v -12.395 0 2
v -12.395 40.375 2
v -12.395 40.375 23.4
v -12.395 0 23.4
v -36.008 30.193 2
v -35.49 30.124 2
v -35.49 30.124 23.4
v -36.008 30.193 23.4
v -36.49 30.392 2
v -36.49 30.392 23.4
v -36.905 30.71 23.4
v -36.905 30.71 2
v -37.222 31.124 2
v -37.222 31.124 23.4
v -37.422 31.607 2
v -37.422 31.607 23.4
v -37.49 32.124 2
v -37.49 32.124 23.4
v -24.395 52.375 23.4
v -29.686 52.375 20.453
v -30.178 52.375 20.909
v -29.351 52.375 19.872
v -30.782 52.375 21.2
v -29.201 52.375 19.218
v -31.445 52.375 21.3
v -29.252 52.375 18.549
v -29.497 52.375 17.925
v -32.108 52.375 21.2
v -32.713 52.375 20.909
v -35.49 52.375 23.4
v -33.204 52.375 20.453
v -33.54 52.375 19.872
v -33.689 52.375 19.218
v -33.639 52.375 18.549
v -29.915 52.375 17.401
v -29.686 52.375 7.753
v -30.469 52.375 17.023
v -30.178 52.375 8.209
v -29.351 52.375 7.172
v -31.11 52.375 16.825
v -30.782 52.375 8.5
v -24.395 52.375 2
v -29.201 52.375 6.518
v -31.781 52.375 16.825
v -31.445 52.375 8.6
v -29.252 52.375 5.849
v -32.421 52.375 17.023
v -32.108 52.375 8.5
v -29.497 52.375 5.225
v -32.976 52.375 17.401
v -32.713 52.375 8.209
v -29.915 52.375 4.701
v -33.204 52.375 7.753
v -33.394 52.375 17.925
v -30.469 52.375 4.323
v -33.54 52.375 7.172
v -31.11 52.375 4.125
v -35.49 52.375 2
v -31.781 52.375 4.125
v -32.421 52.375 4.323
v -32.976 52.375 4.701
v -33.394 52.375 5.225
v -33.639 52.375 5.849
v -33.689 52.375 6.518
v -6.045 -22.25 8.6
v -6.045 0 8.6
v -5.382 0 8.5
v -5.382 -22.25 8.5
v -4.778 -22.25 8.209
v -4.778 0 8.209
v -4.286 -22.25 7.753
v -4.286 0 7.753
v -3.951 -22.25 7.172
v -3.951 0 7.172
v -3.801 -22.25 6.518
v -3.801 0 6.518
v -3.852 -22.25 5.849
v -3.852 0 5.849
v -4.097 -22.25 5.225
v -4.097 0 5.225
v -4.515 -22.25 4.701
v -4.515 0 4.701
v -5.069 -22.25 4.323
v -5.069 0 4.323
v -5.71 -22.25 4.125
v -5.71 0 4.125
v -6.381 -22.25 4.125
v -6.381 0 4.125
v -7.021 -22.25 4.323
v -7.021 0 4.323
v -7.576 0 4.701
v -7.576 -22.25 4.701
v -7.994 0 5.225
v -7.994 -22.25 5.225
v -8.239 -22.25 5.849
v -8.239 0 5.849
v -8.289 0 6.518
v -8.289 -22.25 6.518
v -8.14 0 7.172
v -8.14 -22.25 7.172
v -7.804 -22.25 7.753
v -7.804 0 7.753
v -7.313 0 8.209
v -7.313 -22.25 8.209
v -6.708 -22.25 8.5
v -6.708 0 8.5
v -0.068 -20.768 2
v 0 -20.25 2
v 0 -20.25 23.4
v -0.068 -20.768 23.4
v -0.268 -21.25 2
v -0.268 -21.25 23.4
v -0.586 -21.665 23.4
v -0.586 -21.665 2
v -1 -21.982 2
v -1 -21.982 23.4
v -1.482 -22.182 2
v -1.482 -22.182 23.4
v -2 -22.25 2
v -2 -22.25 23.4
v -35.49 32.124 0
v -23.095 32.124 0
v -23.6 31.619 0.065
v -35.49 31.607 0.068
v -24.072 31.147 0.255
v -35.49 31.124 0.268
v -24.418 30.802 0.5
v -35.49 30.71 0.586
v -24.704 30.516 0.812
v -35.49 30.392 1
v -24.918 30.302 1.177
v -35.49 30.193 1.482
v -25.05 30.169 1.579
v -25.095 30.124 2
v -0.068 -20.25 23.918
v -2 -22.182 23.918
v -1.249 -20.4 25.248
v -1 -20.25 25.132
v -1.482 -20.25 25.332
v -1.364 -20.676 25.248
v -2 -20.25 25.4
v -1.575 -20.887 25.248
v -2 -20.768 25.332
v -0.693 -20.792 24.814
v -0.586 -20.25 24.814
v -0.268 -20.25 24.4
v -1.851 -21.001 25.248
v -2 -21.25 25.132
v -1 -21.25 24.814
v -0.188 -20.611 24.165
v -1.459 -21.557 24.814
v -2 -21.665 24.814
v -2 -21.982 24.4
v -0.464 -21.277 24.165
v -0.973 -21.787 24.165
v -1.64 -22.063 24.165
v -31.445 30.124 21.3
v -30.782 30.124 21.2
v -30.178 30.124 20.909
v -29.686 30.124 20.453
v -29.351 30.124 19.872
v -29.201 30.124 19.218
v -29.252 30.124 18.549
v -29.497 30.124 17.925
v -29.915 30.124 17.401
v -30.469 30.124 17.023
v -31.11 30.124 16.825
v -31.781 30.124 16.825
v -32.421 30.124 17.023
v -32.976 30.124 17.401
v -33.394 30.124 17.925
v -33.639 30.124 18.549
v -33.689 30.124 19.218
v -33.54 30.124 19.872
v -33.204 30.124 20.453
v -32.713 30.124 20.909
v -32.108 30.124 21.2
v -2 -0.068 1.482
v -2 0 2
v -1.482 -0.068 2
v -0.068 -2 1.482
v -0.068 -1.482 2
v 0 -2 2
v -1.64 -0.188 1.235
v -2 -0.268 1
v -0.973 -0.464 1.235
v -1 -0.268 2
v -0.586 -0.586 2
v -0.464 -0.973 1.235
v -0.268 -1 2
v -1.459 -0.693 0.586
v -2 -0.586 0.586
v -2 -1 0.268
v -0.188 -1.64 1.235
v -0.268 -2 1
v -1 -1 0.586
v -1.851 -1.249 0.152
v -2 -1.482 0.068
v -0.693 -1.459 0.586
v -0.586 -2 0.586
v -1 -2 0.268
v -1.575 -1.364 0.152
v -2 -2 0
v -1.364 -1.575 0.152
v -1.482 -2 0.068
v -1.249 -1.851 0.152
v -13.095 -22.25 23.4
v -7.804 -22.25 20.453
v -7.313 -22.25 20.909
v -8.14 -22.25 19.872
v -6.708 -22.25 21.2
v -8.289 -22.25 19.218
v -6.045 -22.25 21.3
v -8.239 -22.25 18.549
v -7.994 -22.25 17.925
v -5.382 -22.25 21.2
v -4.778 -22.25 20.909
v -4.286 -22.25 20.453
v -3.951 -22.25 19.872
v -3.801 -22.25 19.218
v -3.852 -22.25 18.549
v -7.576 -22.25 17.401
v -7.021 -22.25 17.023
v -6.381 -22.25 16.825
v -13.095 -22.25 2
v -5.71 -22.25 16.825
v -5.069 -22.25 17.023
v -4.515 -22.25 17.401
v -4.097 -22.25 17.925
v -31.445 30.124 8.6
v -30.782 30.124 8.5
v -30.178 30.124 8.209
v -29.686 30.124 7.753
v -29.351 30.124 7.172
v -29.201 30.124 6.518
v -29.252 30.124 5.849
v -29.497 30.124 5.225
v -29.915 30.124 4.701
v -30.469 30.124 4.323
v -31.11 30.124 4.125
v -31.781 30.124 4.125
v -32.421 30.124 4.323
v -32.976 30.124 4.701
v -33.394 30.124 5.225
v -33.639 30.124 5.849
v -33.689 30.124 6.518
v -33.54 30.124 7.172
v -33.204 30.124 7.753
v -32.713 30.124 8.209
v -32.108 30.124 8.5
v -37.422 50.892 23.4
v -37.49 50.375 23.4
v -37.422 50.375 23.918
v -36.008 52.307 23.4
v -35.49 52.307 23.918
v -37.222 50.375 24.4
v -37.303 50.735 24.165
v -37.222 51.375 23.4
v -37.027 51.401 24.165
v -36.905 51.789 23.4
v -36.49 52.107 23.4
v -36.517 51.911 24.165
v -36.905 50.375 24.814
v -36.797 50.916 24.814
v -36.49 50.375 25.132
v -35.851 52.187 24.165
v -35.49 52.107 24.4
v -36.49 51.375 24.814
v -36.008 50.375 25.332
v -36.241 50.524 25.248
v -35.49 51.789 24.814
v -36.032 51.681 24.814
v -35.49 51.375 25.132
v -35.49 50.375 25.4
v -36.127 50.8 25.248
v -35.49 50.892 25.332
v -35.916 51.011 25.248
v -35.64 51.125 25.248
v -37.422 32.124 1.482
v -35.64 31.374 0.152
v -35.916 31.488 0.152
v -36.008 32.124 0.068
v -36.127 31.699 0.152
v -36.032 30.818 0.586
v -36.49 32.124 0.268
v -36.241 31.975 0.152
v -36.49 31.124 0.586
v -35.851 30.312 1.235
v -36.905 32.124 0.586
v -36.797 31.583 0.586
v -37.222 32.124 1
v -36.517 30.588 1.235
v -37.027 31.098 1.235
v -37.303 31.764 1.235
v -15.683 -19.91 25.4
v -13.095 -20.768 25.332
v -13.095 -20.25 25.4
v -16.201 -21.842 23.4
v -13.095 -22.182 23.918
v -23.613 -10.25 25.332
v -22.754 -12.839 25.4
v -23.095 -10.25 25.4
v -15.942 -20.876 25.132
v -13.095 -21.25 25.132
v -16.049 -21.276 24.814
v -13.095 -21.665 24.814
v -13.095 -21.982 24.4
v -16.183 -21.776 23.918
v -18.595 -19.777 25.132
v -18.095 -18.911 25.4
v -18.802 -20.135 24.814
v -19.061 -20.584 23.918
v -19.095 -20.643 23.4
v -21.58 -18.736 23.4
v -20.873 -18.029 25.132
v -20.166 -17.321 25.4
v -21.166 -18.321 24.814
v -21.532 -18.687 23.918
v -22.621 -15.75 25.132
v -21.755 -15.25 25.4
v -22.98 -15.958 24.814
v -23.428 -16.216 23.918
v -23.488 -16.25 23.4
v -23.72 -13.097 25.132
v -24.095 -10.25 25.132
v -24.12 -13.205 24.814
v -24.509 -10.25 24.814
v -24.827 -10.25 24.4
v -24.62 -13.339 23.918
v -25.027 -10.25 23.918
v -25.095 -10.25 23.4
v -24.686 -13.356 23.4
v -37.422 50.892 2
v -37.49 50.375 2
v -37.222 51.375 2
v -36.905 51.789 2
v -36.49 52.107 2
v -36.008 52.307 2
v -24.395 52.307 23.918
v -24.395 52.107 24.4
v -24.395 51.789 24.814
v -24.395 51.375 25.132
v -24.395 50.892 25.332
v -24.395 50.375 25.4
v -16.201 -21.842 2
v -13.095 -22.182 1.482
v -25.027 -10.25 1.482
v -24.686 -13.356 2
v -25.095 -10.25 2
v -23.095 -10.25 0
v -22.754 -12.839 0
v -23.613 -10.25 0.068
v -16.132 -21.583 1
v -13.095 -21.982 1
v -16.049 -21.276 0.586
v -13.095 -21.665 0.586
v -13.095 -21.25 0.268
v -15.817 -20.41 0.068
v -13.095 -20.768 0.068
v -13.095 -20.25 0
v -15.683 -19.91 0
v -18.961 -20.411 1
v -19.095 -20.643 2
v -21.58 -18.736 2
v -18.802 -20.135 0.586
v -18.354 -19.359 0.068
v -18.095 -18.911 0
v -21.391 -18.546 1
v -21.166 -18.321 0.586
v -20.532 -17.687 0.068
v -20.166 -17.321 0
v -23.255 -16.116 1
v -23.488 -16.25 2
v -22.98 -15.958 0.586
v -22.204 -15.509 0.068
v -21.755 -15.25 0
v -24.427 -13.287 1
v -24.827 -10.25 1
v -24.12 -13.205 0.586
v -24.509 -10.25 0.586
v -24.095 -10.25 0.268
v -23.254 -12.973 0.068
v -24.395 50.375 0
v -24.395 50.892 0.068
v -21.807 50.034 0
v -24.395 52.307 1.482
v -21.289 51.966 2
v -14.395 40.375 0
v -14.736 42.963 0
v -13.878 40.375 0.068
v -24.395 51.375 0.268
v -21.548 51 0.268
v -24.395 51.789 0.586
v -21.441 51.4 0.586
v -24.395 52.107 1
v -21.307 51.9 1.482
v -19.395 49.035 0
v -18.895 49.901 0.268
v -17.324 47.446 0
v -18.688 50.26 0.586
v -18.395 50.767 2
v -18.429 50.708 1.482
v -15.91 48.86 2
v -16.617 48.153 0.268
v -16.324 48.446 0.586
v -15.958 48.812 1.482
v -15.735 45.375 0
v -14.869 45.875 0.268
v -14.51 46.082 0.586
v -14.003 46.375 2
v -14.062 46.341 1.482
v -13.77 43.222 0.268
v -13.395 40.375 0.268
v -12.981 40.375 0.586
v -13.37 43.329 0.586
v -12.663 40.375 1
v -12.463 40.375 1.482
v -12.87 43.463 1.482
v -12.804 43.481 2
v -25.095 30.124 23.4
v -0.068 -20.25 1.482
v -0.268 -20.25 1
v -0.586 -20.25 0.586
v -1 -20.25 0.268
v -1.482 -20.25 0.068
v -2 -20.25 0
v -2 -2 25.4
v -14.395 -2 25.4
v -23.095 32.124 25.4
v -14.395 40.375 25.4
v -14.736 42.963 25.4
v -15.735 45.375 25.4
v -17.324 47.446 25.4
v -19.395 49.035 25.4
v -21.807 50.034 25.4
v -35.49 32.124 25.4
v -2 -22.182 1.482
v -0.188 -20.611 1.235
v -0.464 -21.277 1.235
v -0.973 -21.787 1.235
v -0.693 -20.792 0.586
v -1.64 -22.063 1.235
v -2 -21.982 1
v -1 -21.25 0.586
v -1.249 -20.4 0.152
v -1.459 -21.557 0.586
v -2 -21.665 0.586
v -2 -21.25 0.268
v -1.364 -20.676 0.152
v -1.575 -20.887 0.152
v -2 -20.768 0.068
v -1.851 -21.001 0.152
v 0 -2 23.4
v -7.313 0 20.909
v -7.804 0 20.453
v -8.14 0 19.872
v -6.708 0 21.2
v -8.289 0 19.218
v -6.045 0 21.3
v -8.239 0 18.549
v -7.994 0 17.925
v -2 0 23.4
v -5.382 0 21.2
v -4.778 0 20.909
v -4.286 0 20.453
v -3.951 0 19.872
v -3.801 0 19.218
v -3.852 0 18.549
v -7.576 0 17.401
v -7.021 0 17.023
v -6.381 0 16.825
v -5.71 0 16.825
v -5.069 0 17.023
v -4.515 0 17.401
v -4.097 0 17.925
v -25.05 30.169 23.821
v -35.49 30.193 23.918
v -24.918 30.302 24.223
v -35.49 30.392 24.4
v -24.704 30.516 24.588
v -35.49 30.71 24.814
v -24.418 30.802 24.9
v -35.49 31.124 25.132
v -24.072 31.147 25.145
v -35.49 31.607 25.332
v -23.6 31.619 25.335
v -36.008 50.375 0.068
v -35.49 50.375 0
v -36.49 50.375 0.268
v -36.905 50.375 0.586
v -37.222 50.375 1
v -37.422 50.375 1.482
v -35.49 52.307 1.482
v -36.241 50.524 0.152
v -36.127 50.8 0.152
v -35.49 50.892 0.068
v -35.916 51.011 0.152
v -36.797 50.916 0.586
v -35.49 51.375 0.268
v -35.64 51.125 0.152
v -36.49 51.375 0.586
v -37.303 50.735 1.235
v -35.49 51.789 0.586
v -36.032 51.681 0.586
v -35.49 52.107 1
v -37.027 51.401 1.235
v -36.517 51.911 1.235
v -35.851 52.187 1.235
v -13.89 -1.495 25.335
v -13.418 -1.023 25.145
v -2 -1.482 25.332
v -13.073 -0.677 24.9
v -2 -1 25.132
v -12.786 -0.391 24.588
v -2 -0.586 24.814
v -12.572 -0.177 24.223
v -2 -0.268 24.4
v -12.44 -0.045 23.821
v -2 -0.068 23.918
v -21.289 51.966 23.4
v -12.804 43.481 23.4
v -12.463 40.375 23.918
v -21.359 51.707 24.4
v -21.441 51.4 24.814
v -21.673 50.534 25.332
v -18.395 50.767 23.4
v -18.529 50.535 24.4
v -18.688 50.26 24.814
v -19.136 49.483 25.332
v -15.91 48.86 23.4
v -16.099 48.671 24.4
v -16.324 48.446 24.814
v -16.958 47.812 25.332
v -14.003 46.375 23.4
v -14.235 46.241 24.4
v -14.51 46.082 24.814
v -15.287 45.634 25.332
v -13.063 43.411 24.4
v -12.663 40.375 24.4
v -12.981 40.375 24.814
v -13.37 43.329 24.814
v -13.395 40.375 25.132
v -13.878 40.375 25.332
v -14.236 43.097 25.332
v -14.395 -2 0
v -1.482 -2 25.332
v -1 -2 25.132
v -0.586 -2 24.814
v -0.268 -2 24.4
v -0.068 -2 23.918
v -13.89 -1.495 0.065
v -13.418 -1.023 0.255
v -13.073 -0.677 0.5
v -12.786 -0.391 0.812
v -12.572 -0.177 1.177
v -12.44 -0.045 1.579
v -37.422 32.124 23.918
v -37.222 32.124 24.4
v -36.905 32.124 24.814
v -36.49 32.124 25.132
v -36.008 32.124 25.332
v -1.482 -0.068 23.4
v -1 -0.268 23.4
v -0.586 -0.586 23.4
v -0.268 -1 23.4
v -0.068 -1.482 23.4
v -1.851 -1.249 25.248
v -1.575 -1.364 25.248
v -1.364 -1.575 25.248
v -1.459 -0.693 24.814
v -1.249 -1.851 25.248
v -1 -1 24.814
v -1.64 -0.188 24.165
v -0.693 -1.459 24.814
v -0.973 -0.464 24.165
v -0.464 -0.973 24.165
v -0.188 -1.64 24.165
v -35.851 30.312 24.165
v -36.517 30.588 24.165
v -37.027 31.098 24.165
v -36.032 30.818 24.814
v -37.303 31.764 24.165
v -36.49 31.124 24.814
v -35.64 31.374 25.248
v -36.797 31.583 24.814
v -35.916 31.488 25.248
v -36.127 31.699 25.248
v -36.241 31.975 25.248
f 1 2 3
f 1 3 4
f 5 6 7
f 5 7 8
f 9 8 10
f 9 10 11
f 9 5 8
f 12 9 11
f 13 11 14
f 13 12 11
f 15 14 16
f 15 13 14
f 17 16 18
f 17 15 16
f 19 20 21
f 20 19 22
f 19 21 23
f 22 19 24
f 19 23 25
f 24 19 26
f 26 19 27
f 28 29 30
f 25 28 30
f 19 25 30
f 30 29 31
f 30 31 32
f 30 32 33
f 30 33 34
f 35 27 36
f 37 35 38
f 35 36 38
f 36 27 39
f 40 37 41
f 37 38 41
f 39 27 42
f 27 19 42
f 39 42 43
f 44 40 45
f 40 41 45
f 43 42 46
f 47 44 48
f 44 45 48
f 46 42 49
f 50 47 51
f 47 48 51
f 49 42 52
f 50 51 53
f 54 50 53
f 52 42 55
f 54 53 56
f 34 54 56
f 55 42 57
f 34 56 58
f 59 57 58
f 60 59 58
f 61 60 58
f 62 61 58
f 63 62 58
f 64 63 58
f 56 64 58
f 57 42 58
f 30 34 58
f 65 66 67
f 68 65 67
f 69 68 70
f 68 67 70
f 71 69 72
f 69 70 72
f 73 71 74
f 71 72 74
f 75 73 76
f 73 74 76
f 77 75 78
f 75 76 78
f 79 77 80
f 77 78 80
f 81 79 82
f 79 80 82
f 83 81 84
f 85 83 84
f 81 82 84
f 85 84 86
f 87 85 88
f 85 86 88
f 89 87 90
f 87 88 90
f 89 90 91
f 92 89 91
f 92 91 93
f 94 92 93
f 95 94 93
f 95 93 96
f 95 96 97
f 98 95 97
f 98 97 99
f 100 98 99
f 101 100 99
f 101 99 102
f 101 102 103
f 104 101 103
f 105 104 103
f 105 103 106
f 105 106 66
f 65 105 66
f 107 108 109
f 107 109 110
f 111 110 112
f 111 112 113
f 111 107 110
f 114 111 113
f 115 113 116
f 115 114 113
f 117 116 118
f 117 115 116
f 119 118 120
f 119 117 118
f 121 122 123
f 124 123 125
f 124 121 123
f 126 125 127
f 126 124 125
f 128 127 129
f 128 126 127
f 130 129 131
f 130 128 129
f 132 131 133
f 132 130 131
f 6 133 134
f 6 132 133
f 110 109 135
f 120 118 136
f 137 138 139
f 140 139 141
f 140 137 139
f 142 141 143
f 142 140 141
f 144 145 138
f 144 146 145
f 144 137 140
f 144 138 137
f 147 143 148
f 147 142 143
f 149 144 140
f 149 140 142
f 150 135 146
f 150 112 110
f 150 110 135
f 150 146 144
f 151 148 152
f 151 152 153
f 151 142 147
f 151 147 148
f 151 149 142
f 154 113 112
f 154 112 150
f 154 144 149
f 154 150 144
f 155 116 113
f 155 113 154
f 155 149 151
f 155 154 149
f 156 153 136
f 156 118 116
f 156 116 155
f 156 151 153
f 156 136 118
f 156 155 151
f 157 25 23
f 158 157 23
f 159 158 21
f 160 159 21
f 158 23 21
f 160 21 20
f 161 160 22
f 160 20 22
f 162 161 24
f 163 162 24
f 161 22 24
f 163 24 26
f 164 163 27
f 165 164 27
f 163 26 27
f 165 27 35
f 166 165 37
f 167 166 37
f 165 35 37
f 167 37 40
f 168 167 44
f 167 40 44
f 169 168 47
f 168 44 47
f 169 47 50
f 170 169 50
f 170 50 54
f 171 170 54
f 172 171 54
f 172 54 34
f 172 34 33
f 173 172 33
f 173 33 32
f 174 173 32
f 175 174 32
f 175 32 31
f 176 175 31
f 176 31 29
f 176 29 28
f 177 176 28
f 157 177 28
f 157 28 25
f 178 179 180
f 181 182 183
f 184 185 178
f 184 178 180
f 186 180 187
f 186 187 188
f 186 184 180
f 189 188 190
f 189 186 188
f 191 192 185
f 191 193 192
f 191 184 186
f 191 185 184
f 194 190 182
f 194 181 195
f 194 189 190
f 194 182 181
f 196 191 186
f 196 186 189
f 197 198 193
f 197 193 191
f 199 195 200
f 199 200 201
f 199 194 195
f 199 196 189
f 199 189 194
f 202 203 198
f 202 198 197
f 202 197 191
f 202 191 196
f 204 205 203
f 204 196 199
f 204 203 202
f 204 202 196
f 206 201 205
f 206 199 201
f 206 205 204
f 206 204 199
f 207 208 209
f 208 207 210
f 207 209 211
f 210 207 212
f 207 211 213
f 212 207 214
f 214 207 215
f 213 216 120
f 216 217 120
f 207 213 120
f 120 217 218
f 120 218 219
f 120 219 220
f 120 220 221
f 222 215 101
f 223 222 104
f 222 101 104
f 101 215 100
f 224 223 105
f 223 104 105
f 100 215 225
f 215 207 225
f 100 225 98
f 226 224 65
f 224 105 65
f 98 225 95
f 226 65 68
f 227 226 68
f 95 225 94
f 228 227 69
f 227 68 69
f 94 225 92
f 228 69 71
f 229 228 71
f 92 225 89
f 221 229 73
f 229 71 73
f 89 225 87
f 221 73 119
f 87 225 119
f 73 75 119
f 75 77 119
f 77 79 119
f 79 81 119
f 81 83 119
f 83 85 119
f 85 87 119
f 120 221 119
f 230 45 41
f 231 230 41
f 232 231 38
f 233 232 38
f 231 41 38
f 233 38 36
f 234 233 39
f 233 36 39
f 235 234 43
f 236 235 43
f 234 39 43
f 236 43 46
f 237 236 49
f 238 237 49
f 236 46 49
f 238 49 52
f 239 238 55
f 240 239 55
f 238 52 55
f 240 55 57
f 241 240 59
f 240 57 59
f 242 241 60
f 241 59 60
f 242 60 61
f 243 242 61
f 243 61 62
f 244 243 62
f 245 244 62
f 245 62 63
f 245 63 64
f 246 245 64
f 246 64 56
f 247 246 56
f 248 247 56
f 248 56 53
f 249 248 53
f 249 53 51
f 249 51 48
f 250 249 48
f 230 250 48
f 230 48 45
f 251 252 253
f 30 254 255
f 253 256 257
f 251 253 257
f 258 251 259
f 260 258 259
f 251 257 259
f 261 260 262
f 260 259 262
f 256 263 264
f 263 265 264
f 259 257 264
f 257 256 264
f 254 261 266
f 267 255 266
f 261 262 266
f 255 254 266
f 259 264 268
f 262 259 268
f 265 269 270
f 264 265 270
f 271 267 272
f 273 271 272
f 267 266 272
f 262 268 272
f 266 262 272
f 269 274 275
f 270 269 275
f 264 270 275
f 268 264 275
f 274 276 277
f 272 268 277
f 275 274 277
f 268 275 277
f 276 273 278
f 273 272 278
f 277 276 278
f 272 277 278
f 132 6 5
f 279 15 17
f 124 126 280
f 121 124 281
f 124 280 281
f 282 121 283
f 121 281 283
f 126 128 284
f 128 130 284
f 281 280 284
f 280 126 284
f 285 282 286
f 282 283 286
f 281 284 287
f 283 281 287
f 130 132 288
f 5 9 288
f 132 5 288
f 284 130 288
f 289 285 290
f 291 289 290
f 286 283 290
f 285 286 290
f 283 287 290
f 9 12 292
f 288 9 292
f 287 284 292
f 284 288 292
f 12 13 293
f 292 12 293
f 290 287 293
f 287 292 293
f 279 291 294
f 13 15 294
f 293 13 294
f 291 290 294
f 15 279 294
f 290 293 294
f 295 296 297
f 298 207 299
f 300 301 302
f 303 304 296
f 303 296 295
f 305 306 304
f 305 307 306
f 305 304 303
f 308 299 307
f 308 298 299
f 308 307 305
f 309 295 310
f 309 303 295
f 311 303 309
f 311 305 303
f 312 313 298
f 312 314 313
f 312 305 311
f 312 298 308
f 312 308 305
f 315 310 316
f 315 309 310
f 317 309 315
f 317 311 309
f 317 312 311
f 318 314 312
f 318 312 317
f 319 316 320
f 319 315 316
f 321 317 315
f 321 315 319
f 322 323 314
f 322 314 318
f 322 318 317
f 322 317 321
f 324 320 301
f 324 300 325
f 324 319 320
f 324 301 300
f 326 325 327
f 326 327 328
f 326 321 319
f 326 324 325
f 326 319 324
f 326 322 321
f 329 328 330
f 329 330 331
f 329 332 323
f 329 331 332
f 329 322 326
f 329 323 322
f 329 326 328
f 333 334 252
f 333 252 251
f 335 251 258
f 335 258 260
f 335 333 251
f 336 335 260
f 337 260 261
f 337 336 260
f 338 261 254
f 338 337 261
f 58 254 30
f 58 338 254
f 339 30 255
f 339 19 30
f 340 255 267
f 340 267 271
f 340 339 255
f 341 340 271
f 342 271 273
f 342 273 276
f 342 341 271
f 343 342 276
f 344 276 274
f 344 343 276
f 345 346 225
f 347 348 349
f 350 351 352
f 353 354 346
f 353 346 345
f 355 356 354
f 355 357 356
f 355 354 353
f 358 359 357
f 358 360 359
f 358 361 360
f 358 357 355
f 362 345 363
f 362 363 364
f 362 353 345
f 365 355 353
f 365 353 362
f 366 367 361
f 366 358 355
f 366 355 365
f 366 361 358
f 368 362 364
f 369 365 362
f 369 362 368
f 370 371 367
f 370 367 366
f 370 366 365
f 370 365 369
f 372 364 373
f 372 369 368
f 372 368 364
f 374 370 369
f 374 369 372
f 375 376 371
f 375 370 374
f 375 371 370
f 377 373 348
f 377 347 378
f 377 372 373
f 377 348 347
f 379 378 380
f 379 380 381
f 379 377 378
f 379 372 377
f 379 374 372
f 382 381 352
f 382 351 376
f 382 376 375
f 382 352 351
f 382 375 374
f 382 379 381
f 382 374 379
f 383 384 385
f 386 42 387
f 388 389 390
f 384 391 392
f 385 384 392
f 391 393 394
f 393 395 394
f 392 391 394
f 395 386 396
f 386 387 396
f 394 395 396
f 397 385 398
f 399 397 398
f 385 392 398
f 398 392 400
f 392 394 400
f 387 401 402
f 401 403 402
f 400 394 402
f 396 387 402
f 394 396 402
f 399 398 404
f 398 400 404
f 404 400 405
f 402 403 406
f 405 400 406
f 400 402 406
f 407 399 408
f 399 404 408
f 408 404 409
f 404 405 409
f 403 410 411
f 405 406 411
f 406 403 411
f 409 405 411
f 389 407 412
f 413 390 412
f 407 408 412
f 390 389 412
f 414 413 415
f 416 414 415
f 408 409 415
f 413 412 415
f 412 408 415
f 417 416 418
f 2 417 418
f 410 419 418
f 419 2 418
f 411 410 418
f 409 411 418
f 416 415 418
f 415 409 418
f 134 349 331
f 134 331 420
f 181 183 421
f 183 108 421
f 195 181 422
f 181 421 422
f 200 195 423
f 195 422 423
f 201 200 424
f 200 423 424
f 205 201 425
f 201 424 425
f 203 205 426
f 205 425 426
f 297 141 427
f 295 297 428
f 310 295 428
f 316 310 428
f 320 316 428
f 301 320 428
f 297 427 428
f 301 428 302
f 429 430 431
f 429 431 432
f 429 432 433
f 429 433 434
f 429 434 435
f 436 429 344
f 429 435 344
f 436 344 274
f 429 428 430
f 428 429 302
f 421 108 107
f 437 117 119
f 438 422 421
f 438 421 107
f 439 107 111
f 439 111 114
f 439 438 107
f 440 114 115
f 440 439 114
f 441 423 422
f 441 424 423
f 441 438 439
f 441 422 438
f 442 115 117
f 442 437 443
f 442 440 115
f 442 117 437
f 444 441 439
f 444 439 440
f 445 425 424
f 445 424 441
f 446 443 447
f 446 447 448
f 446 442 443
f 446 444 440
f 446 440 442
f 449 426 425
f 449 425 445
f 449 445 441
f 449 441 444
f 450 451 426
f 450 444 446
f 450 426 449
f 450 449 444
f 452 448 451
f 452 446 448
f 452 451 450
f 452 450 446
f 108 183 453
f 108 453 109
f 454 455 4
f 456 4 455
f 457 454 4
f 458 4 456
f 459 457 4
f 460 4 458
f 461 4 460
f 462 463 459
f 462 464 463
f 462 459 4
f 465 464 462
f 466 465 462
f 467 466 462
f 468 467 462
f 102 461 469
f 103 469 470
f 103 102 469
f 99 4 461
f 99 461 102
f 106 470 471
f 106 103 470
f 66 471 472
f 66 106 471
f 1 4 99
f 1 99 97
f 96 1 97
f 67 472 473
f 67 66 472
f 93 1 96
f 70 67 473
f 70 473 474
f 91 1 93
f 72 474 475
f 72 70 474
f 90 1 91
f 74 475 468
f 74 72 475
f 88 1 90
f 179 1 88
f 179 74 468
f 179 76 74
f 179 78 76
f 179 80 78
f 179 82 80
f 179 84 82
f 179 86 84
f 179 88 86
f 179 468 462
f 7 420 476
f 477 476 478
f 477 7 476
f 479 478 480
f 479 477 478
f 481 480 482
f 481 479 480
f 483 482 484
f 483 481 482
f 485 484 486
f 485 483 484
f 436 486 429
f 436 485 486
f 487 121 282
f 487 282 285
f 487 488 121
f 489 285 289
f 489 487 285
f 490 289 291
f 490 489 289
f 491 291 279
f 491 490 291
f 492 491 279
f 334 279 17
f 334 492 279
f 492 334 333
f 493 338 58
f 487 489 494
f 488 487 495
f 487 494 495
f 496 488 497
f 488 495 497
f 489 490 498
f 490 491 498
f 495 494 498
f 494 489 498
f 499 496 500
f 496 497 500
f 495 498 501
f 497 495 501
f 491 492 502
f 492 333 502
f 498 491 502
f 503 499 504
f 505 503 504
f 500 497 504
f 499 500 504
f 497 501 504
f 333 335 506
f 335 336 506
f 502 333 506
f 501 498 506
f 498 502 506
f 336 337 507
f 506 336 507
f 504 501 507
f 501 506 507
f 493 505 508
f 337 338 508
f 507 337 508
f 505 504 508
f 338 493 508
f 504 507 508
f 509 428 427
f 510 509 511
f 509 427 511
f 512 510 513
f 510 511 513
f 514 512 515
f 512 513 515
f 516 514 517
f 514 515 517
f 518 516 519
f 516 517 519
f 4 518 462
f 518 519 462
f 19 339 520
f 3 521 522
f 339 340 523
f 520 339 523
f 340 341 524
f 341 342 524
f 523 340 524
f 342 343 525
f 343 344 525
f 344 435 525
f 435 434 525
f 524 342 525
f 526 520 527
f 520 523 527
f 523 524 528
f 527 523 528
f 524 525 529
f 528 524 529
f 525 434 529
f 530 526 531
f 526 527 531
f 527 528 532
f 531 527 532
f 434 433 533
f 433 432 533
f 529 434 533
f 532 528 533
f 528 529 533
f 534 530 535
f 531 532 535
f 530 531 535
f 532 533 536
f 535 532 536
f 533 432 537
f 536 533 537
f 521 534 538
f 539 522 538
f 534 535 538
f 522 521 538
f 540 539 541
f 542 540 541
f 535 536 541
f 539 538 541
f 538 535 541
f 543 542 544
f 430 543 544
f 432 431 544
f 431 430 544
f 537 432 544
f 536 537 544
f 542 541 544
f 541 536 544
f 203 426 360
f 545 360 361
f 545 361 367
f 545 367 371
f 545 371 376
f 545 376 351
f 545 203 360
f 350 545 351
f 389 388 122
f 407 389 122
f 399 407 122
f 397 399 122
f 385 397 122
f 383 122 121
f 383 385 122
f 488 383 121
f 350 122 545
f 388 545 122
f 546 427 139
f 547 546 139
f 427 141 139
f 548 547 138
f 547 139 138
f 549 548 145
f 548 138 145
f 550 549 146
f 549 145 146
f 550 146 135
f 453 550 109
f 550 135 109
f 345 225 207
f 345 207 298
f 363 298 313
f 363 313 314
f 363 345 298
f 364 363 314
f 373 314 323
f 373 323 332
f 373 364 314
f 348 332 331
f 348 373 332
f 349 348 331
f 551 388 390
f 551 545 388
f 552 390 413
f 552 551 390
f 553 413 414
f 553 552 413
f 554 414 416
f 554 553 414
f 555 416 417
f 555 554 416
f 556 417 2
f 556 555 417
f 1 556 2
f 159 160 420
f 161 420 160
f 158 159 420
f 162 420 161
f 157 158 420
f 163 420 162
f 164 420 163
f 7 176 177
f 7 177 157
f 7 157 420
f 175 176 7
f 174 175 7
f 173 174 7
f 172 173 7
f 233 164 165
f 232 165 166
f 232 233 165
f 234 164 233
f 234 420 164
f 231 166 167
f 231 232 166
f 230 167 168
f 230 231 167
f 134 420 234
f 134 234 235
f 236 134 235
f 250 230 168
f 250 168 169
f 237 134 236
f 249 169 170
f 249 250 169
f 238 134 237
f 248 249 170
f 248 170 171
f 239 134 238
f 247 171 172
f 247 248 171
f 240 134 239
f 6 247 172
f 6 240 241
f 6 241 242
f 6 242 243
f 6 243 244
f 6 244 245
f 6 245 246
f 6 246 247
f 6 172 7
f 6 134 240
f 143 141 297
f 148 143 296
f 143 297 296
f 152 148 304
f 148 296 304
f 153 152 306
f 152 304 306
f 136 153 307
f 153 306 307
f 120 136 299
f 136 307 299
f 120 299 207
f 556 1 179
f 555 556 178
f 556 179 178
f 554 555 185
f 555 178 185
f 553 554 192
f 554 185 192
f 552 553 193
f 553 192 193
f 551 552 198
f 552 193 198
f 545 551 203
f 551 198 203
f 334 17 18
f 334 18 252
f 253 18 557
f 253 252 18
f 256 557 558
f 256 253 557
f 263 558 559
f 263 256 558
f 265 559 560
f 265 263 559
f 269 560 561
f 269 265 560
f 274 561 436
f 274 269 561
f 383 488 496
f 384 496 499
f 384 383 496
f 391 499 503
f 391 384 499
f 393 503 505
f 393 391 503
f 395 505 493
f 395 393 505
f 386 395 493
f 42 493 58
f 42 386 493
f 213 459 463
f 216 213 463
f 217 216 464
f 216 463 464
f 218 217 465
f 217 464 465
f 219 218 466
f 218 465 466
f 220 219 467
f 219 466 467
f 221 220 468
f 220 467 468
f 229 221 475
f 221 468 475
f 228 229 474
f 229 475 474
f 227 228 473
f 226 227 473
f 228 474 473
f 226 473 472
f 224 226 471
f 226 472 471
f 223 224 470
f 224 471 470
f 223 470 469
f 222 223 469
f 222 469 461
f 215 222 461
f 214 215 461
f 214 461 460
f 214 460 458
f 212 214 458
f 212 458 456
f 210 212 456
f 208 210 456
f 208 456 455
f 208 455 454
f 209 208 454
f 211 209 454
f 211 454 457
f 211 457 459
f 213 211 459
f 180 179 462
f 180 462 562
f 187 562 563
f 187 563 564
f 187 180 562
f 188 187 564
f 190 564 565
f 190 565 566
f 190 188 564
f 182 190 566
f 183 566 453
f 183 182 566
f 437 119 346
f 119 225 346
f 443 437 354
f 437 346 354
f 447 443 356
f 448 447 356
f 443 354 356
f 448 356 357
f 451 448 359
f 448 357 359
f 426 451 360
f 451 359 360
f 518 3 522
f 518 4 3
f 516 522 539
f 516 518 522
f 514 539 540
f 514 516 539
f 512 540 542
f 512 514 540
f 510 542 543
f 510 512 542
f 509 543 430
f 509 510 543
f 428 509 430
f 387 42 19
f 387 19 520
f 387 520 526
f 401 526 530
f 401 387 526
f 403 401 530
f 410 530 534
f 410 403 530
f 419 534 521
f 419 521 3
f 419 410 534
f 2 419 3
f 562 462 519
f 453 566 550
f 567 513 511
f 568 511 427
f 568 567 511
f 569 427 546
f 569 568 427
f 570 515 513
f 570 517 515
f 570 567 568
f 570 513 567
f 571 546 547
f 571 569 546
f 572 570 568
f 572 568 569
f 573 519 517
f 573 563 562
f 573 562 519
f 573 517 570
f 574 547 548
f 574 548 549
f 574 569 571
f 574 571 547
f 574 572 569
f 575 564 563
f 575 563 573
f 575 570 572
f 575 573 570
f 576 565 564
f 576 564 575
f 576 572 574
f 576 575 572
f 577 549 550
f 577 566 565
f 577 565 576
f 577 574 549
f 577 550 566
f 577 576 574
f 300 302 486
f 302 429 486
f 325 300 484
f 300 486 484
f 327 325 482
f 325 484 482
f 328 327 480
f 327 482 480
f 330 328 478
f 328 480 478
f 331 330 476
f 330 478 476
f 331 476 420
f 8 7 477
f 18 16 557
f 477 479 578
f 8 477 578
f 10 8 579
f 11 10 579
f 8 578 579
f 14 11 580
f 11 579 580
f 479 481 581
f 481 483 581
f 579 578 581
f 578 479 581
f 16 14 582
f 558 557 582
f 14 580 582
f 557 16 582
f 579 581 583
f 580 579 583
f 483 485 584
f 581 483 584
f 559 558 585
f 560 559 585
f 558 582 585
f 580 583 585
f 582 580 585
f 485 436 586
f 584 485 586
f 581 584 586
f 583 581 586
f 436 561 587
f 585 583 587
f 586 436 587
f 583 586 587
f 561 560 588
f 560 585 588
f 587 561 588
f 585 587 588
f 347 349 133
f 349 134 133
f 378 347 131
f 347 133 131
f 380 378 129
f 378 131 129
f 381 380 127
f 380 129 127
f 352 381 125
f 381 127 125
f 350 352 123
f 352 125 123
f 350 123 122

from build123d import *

# Parameters (mm, degrees)
BOSS_EXTRUDE1_DEPTH = 25.4
SKETCH2_R           = 2.25
CUT_EXTRUDE1_DEPTH  = 88.290380725
FILLET1_R           = 2


with BuildPart() as part:
    # Sketch1 → Boss-Extrude1 (new body)
    with BuildSketch(Plane.XY):
        with BuildLine():
            Line((-12.3952, 40.3748), (-12.3952, 0))
            Line((-12.3952, 0), (-12.3952, -22.2504))
            Line((-12.3952, -22.2504), (-13.0952, -22.2504))
            ThreePointArc((-13.0952, -22.2504), (-21.580481374, -18.735681374), (-25.0952, -10.2504))
            Line((-25.0952, -10.2504), (-25.0952, 30.1244))
            Line((-25.0952, 30.1244), (-25.0952, 52.3748))
            Line((-25.0952, 52.3748), (-24.3952, 52.3748))
            ThreePointArc((-24.3952, 52.3748), (-15.909918626, 48.860081374), (-12.3952, 40.3748))
        make_face()
        with BuildLine():
            ThreePointArc((-37.4904, 50.3748), (-36.904613562, 51.789013562), (-35.4904, 52.3748))
            Line((-35.4904, 52.3748), (-25.0952, 52.3748))
            Line((-25.0952, 52.3748), (-25.0952, 30.1244))
            Line((-25.0952, 30.1244), (-35.4904, 30.1244))
            ThreePointArc((-35.4904, 30.1244), (-36.904613562, 30.710186438), (-37.4904, 32.1244))
            Line((-37.4904, 32.1244), (-37.4904, 50.3748))
        make_face()
        with BuildLine():
            ThreePointArc((0, -20.2504), (-0.585786438, -21.664613562), (-2, -22.2504))
            Line((-2, -22.2504), (-12.3952, -22.2504))
            Line((-12.3952, -22.2504), (-12.3952, 0))
            Line((-12.3952, 0), (-2, 0))
            ThreePointArc((-2, 0), (-0.585786438, -0.585786438), (0, -2))
            Line((0, -2), (0, -20.2504))
        make_face()
    extrude(amount=BOSS_EXTRUDE1_DEPTH)

    # Sketch2 → Cut-Extrude1 (cut, through all)
    with BuildSketch(Plane(origin=(0, 52.3748, 0), x_dir=(1, 0, 0), z_dir=(0, 1, 0))):
        with Locations(Location((-31.4452, -6.35, 0), (0, 0, 270))):
            Circle(SKETCH2_R)
        with Locations(Location((-31.4452, -19.05, 0), (0, 0, 270))):
            Circle(SKETCH2_R)
        with Locations(Location((-6.0452, -6.35, 0), (0, 0, 270))):
            Circle(SKETCH2_R)
        with Locations(Location((-6.0452, -19.05, 0), (0, 0, 270))):
            Circle(SKETCH2_R)
    extrude(amount=-CUT_EXTRUDE1_DEPTH, mode=Mode.SUBTRACT)

    # Fillet1
    fillet1_edges = [part.edges().sort_by_distance(p)[0] for p in [
        (-15.909918626, 48.860081374, 25.4),
        (-29.9428, 52.3748, 25.4),
        (-7.1976, 0, 0),
        (-0.585786438, -0.585786438, 0),
        (0, -11.1252, 0),
        (-0.585786438, -21.664613562, 0),
        (-7.5476, -22.2504, 0),
        (-21.580481374, -18.735681374, 0),
        (-25.0952, 9.937, 0),
        (-30.2928, 30.1244, 0),
        (-36.904613562, 30.710186438, 0),
        (-37.4904, 41.2496, 0),
        (-36.904613562, 51.789013562, 0),
        (-29.9428, 52.3748, 0),
        (-15.909918626, 48.860081374, 0),
        (-36.904613562, 51.789013562, 25.4),
        (-12.3952, 20.1874, 0),
        (-37.4904, 41.2496, 25.4),
        (-36.904613562, 30.710186438, 25.4),
        (-30.2928, 30.1244, 25.4),
        (-25.0952, 9.937, 25.4),
        (-21.580481374, -18.735681374, 25.4),
        (-12.3952, 20.1874, 25.4),
        (-7.5476, -22.2504, 25.4),
        (-0.585786438, -21.664613562, 25.4),
        (0, -11.1252, 25.4),
        (-0.585786438, -0.585786438, 25.4),
        (-7.1976, 0, 25.4),
    ]]
    fillet(fillet1_edges, radius=FILLET1_R)


solid = part.part
